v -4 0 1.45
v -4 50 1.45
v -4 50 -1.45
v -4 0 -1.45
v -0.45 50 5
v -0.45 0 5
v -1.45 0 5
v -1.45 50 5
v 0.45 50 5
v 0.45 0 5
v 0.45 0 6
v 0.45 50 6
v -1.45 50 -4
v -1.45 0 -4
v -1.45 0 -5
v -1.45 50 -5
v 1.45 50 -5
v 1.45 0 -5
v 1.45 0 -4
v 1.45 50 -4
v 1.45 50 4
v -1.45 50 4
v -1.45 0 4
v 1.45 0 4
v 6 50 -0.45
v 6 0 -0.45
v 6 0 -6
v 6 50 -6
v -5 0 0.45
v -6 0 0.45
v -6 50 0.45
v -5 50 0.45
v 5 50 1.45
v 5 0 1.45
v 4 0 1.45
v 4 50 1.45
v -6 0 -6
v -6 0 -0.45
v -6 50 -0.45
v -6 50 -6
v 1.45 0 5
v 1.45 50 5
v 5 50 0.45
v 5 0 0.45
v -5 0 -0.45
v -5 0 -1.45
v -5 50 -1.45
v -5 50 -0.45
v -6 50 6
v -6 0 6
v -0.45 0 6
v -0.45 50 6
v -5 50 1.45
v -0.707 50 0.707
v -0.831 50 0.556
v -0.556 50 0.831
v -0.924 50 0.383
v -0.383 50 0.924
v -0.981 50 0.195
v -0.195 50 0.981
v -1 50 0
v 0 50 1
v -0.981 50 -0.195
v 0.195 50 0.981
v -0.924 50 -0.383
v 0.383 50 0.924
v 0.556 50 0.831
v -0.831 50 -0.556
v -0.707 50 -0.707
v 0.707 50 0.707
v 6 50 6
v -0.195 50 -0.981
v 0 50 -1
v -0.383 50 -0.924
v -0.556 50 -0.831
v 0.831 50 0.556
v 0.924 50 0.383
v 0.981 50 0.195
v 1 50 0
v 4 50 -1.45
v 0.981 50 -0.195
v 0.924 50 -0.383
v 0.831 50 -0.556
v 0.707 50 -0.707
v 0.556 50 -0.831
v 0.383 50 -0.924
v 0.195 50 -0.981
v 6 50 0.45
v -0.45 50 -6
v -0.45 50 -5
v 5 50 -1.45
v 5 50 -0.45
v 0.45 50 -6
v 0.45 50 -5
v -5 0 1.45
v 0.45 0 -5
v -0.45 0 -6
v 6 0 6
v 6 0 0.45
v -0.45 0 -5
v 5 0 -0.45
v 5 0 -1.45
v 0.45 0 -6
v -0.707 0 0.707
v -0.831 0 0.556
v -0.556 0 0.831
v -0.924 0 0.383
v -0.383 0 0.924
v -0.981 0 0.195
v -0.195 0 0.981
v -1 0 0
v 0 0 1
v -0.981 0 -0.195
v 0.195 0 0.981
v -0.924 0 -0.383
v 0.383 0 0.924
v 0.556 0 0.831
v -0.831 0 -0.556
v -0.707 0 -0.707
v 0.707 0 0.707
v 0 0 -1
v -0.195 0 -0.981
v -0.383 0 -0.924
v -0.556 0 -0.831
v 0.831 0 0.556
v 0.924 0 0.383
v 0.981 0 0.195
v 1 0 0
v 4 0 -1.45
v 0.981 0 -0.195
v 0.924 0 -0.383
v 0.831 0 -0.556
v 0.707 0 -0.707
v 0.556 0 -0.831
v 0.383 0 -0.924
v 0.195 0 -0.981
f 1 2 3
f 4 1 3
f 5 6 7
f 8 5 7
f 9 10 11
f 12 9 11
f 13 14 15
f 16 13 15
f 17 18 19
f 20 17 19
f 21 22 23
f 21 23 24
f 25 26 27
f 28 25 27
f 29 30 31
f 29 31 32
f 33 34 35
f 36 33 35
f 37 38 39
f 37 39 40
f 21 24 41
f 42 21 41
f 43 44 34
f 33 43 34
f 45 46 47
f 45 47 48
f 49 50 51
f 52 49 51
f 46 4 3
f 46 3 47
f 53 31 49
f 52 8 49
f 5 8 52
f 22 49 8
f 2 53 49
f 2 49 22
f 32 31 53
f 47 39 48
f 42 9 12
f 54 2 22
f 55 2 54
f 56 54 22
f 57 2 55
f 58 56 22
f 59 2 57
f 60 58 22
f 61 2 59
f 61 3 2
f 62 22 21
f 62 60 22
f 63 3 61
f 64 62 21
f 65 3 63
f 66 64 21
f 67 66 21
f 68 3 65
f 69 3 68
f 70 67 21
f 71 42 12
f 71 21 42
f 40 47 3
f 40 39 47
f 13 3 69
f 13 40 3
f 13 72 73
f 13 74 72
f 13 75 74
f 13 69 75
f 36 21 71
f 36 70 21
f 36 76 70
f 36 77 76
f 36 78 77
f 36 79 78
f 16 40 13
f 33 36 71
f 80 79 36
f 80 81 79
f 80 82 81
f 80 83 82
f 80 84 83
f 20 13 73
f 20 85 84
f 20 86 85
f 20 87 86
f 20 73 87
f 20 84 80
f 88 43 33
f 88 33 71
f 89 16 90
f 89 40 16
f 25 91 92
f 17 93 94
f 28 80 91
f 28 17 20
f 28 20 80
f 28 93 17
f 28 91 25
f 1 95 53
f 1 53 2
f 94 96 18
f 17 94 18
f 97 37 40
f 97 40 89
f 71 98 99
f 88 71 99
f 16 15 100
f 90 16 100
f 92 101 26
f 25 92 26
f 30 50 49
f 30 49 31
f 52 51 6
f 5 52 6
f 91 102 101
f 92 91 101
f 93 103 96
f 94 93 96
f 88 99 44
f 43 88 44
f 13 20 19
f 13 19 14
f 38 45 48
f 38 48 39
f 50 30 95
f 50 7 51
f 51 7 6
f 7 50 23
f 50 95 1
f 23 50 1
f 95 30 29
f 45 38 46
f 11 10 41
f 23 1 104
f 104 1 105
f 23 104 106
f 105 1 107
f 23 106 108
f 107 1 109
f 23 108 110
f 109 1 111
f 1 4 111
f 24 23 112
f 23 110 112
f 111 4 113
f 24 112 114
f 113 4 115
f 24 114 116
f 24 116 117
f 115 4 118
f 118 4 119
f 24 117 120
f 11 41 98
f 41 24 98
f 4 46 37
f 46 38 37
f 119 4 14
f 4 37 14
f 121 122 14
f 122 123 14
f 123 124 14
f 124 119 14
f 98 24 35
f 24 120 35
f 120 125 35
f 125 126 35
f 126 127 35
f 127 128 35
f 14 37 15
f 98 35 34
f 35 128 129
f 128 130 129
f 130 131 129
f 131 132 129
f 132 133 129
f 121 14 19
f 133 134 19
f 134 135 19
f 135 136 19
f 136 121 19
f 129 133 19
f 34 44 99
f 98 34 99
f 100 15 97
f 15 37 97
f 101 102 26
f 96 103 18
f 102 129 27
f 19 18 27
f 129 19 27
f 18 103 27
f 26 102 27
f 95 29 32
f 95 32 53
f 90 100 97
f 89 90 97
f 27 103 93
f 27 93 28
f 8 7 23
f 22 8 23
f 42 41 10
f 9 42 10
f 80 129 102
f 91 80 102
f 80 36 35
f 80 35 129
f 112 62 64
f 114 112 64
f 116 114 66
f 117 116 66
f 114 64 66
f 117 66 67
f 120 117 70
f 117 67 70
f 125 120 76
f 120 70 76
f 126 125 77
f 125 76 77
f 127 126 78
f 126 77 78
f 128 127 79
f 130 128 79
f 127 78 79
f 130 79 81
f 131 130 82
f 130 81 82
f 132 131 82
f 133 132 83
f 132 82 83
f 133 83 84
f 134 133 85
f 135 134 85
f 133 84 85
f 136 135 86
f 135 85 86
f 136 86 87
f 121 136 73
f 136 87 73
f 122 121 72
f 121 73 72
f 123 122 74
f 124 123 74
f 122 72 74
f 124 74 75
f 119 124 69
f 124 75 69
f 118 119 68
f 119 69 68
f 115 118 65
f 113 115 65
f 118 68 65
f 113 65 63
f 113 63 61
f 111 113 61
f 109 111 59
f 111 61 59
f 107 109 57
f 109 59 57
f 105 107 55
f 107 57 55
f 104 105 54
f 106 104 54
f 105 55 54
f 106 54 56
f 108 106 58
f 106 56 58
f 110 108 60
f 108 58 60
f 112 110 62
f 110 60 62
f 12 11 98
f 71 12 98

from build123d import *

# Parameters (mm, degrees)
ESQUISSE1_W             = 12
ESQUISSE1_H             = 12
BOSS_EXTRU_1_DEPTH      = 50
ENL_V_MAT_EXTRU_1_DEPTH = 50
ESQUISSE3_R             = 1
ENL_V_MAT_EXTRU_2_DEPTH = 50


with BuildPart() as part:
    # Esquisse1 → Boss.-Extru.1 (new body)
    with BuildSketch(Plane(origin=(0, 0, 0), x_dir=(1, 0, 0), z_dir=(0, 1, 0))):
        Rectangle(ESQUISSE1_W, ESQUISSE1_H)
    extrude(amount=BOSS_EXTRU_1_DEPTH)

    # Esquisse2 → Enlèv. mat.-Extru.1 (cut)
    with BuildSketch(Plane(origin=(0, 50, 0), x_dir=(1, 0, 0), z_dir=(0, 1, 0))):
        Polygon((-5, -0.45), (-5, -1.45), (-4, -1.45), (-4, 1.45), (-5, 1.45), (-5, 0.45), (-6, 0.45), (-6, -0.45), align=None)
        Polygon((1.45, 5), (1.45, 4), (-1.45, 4), (-1.45, 5), (-0.45, 5), (-0.45, 6), (0.45, 6), (0.45, 5), align=None)
        Polygon((5, -1.45), (4, -1.45), (4, 1.45), (5, 1.45), (5, 0.45), (6, 0.45), (6, -0.45), (5, -0.45), align=None)
        Polygon((-1.45, -5), (-1.45, -4), (1.45, -4), (1.45, -5), (0.45, -5), (0.45, -6), (-0.45, -6), (-0.45, -5), align=None)
    extrude(amount=-ENL_V_MAT_EXTRU_1_DEPTH, mode=Mode.SUBTRACT)

    # Esquisse3 → Enlèv. mat.-Extru.2 (cut)
    with BuildSketch(Plane(origin=(0, 50, 0), x_dir=(1, 0, 0), z_dir=(0, 1, 0))):
        with Locations(Location((0, 0, 0), (0, 0, 270))):
            Circle(ESQUISSE3_R)
    extrude(amount=-ENL_V_MAT_EXTRU_2_DEPTH, mode=Mode.SUBTRACT)


solid = part.part
